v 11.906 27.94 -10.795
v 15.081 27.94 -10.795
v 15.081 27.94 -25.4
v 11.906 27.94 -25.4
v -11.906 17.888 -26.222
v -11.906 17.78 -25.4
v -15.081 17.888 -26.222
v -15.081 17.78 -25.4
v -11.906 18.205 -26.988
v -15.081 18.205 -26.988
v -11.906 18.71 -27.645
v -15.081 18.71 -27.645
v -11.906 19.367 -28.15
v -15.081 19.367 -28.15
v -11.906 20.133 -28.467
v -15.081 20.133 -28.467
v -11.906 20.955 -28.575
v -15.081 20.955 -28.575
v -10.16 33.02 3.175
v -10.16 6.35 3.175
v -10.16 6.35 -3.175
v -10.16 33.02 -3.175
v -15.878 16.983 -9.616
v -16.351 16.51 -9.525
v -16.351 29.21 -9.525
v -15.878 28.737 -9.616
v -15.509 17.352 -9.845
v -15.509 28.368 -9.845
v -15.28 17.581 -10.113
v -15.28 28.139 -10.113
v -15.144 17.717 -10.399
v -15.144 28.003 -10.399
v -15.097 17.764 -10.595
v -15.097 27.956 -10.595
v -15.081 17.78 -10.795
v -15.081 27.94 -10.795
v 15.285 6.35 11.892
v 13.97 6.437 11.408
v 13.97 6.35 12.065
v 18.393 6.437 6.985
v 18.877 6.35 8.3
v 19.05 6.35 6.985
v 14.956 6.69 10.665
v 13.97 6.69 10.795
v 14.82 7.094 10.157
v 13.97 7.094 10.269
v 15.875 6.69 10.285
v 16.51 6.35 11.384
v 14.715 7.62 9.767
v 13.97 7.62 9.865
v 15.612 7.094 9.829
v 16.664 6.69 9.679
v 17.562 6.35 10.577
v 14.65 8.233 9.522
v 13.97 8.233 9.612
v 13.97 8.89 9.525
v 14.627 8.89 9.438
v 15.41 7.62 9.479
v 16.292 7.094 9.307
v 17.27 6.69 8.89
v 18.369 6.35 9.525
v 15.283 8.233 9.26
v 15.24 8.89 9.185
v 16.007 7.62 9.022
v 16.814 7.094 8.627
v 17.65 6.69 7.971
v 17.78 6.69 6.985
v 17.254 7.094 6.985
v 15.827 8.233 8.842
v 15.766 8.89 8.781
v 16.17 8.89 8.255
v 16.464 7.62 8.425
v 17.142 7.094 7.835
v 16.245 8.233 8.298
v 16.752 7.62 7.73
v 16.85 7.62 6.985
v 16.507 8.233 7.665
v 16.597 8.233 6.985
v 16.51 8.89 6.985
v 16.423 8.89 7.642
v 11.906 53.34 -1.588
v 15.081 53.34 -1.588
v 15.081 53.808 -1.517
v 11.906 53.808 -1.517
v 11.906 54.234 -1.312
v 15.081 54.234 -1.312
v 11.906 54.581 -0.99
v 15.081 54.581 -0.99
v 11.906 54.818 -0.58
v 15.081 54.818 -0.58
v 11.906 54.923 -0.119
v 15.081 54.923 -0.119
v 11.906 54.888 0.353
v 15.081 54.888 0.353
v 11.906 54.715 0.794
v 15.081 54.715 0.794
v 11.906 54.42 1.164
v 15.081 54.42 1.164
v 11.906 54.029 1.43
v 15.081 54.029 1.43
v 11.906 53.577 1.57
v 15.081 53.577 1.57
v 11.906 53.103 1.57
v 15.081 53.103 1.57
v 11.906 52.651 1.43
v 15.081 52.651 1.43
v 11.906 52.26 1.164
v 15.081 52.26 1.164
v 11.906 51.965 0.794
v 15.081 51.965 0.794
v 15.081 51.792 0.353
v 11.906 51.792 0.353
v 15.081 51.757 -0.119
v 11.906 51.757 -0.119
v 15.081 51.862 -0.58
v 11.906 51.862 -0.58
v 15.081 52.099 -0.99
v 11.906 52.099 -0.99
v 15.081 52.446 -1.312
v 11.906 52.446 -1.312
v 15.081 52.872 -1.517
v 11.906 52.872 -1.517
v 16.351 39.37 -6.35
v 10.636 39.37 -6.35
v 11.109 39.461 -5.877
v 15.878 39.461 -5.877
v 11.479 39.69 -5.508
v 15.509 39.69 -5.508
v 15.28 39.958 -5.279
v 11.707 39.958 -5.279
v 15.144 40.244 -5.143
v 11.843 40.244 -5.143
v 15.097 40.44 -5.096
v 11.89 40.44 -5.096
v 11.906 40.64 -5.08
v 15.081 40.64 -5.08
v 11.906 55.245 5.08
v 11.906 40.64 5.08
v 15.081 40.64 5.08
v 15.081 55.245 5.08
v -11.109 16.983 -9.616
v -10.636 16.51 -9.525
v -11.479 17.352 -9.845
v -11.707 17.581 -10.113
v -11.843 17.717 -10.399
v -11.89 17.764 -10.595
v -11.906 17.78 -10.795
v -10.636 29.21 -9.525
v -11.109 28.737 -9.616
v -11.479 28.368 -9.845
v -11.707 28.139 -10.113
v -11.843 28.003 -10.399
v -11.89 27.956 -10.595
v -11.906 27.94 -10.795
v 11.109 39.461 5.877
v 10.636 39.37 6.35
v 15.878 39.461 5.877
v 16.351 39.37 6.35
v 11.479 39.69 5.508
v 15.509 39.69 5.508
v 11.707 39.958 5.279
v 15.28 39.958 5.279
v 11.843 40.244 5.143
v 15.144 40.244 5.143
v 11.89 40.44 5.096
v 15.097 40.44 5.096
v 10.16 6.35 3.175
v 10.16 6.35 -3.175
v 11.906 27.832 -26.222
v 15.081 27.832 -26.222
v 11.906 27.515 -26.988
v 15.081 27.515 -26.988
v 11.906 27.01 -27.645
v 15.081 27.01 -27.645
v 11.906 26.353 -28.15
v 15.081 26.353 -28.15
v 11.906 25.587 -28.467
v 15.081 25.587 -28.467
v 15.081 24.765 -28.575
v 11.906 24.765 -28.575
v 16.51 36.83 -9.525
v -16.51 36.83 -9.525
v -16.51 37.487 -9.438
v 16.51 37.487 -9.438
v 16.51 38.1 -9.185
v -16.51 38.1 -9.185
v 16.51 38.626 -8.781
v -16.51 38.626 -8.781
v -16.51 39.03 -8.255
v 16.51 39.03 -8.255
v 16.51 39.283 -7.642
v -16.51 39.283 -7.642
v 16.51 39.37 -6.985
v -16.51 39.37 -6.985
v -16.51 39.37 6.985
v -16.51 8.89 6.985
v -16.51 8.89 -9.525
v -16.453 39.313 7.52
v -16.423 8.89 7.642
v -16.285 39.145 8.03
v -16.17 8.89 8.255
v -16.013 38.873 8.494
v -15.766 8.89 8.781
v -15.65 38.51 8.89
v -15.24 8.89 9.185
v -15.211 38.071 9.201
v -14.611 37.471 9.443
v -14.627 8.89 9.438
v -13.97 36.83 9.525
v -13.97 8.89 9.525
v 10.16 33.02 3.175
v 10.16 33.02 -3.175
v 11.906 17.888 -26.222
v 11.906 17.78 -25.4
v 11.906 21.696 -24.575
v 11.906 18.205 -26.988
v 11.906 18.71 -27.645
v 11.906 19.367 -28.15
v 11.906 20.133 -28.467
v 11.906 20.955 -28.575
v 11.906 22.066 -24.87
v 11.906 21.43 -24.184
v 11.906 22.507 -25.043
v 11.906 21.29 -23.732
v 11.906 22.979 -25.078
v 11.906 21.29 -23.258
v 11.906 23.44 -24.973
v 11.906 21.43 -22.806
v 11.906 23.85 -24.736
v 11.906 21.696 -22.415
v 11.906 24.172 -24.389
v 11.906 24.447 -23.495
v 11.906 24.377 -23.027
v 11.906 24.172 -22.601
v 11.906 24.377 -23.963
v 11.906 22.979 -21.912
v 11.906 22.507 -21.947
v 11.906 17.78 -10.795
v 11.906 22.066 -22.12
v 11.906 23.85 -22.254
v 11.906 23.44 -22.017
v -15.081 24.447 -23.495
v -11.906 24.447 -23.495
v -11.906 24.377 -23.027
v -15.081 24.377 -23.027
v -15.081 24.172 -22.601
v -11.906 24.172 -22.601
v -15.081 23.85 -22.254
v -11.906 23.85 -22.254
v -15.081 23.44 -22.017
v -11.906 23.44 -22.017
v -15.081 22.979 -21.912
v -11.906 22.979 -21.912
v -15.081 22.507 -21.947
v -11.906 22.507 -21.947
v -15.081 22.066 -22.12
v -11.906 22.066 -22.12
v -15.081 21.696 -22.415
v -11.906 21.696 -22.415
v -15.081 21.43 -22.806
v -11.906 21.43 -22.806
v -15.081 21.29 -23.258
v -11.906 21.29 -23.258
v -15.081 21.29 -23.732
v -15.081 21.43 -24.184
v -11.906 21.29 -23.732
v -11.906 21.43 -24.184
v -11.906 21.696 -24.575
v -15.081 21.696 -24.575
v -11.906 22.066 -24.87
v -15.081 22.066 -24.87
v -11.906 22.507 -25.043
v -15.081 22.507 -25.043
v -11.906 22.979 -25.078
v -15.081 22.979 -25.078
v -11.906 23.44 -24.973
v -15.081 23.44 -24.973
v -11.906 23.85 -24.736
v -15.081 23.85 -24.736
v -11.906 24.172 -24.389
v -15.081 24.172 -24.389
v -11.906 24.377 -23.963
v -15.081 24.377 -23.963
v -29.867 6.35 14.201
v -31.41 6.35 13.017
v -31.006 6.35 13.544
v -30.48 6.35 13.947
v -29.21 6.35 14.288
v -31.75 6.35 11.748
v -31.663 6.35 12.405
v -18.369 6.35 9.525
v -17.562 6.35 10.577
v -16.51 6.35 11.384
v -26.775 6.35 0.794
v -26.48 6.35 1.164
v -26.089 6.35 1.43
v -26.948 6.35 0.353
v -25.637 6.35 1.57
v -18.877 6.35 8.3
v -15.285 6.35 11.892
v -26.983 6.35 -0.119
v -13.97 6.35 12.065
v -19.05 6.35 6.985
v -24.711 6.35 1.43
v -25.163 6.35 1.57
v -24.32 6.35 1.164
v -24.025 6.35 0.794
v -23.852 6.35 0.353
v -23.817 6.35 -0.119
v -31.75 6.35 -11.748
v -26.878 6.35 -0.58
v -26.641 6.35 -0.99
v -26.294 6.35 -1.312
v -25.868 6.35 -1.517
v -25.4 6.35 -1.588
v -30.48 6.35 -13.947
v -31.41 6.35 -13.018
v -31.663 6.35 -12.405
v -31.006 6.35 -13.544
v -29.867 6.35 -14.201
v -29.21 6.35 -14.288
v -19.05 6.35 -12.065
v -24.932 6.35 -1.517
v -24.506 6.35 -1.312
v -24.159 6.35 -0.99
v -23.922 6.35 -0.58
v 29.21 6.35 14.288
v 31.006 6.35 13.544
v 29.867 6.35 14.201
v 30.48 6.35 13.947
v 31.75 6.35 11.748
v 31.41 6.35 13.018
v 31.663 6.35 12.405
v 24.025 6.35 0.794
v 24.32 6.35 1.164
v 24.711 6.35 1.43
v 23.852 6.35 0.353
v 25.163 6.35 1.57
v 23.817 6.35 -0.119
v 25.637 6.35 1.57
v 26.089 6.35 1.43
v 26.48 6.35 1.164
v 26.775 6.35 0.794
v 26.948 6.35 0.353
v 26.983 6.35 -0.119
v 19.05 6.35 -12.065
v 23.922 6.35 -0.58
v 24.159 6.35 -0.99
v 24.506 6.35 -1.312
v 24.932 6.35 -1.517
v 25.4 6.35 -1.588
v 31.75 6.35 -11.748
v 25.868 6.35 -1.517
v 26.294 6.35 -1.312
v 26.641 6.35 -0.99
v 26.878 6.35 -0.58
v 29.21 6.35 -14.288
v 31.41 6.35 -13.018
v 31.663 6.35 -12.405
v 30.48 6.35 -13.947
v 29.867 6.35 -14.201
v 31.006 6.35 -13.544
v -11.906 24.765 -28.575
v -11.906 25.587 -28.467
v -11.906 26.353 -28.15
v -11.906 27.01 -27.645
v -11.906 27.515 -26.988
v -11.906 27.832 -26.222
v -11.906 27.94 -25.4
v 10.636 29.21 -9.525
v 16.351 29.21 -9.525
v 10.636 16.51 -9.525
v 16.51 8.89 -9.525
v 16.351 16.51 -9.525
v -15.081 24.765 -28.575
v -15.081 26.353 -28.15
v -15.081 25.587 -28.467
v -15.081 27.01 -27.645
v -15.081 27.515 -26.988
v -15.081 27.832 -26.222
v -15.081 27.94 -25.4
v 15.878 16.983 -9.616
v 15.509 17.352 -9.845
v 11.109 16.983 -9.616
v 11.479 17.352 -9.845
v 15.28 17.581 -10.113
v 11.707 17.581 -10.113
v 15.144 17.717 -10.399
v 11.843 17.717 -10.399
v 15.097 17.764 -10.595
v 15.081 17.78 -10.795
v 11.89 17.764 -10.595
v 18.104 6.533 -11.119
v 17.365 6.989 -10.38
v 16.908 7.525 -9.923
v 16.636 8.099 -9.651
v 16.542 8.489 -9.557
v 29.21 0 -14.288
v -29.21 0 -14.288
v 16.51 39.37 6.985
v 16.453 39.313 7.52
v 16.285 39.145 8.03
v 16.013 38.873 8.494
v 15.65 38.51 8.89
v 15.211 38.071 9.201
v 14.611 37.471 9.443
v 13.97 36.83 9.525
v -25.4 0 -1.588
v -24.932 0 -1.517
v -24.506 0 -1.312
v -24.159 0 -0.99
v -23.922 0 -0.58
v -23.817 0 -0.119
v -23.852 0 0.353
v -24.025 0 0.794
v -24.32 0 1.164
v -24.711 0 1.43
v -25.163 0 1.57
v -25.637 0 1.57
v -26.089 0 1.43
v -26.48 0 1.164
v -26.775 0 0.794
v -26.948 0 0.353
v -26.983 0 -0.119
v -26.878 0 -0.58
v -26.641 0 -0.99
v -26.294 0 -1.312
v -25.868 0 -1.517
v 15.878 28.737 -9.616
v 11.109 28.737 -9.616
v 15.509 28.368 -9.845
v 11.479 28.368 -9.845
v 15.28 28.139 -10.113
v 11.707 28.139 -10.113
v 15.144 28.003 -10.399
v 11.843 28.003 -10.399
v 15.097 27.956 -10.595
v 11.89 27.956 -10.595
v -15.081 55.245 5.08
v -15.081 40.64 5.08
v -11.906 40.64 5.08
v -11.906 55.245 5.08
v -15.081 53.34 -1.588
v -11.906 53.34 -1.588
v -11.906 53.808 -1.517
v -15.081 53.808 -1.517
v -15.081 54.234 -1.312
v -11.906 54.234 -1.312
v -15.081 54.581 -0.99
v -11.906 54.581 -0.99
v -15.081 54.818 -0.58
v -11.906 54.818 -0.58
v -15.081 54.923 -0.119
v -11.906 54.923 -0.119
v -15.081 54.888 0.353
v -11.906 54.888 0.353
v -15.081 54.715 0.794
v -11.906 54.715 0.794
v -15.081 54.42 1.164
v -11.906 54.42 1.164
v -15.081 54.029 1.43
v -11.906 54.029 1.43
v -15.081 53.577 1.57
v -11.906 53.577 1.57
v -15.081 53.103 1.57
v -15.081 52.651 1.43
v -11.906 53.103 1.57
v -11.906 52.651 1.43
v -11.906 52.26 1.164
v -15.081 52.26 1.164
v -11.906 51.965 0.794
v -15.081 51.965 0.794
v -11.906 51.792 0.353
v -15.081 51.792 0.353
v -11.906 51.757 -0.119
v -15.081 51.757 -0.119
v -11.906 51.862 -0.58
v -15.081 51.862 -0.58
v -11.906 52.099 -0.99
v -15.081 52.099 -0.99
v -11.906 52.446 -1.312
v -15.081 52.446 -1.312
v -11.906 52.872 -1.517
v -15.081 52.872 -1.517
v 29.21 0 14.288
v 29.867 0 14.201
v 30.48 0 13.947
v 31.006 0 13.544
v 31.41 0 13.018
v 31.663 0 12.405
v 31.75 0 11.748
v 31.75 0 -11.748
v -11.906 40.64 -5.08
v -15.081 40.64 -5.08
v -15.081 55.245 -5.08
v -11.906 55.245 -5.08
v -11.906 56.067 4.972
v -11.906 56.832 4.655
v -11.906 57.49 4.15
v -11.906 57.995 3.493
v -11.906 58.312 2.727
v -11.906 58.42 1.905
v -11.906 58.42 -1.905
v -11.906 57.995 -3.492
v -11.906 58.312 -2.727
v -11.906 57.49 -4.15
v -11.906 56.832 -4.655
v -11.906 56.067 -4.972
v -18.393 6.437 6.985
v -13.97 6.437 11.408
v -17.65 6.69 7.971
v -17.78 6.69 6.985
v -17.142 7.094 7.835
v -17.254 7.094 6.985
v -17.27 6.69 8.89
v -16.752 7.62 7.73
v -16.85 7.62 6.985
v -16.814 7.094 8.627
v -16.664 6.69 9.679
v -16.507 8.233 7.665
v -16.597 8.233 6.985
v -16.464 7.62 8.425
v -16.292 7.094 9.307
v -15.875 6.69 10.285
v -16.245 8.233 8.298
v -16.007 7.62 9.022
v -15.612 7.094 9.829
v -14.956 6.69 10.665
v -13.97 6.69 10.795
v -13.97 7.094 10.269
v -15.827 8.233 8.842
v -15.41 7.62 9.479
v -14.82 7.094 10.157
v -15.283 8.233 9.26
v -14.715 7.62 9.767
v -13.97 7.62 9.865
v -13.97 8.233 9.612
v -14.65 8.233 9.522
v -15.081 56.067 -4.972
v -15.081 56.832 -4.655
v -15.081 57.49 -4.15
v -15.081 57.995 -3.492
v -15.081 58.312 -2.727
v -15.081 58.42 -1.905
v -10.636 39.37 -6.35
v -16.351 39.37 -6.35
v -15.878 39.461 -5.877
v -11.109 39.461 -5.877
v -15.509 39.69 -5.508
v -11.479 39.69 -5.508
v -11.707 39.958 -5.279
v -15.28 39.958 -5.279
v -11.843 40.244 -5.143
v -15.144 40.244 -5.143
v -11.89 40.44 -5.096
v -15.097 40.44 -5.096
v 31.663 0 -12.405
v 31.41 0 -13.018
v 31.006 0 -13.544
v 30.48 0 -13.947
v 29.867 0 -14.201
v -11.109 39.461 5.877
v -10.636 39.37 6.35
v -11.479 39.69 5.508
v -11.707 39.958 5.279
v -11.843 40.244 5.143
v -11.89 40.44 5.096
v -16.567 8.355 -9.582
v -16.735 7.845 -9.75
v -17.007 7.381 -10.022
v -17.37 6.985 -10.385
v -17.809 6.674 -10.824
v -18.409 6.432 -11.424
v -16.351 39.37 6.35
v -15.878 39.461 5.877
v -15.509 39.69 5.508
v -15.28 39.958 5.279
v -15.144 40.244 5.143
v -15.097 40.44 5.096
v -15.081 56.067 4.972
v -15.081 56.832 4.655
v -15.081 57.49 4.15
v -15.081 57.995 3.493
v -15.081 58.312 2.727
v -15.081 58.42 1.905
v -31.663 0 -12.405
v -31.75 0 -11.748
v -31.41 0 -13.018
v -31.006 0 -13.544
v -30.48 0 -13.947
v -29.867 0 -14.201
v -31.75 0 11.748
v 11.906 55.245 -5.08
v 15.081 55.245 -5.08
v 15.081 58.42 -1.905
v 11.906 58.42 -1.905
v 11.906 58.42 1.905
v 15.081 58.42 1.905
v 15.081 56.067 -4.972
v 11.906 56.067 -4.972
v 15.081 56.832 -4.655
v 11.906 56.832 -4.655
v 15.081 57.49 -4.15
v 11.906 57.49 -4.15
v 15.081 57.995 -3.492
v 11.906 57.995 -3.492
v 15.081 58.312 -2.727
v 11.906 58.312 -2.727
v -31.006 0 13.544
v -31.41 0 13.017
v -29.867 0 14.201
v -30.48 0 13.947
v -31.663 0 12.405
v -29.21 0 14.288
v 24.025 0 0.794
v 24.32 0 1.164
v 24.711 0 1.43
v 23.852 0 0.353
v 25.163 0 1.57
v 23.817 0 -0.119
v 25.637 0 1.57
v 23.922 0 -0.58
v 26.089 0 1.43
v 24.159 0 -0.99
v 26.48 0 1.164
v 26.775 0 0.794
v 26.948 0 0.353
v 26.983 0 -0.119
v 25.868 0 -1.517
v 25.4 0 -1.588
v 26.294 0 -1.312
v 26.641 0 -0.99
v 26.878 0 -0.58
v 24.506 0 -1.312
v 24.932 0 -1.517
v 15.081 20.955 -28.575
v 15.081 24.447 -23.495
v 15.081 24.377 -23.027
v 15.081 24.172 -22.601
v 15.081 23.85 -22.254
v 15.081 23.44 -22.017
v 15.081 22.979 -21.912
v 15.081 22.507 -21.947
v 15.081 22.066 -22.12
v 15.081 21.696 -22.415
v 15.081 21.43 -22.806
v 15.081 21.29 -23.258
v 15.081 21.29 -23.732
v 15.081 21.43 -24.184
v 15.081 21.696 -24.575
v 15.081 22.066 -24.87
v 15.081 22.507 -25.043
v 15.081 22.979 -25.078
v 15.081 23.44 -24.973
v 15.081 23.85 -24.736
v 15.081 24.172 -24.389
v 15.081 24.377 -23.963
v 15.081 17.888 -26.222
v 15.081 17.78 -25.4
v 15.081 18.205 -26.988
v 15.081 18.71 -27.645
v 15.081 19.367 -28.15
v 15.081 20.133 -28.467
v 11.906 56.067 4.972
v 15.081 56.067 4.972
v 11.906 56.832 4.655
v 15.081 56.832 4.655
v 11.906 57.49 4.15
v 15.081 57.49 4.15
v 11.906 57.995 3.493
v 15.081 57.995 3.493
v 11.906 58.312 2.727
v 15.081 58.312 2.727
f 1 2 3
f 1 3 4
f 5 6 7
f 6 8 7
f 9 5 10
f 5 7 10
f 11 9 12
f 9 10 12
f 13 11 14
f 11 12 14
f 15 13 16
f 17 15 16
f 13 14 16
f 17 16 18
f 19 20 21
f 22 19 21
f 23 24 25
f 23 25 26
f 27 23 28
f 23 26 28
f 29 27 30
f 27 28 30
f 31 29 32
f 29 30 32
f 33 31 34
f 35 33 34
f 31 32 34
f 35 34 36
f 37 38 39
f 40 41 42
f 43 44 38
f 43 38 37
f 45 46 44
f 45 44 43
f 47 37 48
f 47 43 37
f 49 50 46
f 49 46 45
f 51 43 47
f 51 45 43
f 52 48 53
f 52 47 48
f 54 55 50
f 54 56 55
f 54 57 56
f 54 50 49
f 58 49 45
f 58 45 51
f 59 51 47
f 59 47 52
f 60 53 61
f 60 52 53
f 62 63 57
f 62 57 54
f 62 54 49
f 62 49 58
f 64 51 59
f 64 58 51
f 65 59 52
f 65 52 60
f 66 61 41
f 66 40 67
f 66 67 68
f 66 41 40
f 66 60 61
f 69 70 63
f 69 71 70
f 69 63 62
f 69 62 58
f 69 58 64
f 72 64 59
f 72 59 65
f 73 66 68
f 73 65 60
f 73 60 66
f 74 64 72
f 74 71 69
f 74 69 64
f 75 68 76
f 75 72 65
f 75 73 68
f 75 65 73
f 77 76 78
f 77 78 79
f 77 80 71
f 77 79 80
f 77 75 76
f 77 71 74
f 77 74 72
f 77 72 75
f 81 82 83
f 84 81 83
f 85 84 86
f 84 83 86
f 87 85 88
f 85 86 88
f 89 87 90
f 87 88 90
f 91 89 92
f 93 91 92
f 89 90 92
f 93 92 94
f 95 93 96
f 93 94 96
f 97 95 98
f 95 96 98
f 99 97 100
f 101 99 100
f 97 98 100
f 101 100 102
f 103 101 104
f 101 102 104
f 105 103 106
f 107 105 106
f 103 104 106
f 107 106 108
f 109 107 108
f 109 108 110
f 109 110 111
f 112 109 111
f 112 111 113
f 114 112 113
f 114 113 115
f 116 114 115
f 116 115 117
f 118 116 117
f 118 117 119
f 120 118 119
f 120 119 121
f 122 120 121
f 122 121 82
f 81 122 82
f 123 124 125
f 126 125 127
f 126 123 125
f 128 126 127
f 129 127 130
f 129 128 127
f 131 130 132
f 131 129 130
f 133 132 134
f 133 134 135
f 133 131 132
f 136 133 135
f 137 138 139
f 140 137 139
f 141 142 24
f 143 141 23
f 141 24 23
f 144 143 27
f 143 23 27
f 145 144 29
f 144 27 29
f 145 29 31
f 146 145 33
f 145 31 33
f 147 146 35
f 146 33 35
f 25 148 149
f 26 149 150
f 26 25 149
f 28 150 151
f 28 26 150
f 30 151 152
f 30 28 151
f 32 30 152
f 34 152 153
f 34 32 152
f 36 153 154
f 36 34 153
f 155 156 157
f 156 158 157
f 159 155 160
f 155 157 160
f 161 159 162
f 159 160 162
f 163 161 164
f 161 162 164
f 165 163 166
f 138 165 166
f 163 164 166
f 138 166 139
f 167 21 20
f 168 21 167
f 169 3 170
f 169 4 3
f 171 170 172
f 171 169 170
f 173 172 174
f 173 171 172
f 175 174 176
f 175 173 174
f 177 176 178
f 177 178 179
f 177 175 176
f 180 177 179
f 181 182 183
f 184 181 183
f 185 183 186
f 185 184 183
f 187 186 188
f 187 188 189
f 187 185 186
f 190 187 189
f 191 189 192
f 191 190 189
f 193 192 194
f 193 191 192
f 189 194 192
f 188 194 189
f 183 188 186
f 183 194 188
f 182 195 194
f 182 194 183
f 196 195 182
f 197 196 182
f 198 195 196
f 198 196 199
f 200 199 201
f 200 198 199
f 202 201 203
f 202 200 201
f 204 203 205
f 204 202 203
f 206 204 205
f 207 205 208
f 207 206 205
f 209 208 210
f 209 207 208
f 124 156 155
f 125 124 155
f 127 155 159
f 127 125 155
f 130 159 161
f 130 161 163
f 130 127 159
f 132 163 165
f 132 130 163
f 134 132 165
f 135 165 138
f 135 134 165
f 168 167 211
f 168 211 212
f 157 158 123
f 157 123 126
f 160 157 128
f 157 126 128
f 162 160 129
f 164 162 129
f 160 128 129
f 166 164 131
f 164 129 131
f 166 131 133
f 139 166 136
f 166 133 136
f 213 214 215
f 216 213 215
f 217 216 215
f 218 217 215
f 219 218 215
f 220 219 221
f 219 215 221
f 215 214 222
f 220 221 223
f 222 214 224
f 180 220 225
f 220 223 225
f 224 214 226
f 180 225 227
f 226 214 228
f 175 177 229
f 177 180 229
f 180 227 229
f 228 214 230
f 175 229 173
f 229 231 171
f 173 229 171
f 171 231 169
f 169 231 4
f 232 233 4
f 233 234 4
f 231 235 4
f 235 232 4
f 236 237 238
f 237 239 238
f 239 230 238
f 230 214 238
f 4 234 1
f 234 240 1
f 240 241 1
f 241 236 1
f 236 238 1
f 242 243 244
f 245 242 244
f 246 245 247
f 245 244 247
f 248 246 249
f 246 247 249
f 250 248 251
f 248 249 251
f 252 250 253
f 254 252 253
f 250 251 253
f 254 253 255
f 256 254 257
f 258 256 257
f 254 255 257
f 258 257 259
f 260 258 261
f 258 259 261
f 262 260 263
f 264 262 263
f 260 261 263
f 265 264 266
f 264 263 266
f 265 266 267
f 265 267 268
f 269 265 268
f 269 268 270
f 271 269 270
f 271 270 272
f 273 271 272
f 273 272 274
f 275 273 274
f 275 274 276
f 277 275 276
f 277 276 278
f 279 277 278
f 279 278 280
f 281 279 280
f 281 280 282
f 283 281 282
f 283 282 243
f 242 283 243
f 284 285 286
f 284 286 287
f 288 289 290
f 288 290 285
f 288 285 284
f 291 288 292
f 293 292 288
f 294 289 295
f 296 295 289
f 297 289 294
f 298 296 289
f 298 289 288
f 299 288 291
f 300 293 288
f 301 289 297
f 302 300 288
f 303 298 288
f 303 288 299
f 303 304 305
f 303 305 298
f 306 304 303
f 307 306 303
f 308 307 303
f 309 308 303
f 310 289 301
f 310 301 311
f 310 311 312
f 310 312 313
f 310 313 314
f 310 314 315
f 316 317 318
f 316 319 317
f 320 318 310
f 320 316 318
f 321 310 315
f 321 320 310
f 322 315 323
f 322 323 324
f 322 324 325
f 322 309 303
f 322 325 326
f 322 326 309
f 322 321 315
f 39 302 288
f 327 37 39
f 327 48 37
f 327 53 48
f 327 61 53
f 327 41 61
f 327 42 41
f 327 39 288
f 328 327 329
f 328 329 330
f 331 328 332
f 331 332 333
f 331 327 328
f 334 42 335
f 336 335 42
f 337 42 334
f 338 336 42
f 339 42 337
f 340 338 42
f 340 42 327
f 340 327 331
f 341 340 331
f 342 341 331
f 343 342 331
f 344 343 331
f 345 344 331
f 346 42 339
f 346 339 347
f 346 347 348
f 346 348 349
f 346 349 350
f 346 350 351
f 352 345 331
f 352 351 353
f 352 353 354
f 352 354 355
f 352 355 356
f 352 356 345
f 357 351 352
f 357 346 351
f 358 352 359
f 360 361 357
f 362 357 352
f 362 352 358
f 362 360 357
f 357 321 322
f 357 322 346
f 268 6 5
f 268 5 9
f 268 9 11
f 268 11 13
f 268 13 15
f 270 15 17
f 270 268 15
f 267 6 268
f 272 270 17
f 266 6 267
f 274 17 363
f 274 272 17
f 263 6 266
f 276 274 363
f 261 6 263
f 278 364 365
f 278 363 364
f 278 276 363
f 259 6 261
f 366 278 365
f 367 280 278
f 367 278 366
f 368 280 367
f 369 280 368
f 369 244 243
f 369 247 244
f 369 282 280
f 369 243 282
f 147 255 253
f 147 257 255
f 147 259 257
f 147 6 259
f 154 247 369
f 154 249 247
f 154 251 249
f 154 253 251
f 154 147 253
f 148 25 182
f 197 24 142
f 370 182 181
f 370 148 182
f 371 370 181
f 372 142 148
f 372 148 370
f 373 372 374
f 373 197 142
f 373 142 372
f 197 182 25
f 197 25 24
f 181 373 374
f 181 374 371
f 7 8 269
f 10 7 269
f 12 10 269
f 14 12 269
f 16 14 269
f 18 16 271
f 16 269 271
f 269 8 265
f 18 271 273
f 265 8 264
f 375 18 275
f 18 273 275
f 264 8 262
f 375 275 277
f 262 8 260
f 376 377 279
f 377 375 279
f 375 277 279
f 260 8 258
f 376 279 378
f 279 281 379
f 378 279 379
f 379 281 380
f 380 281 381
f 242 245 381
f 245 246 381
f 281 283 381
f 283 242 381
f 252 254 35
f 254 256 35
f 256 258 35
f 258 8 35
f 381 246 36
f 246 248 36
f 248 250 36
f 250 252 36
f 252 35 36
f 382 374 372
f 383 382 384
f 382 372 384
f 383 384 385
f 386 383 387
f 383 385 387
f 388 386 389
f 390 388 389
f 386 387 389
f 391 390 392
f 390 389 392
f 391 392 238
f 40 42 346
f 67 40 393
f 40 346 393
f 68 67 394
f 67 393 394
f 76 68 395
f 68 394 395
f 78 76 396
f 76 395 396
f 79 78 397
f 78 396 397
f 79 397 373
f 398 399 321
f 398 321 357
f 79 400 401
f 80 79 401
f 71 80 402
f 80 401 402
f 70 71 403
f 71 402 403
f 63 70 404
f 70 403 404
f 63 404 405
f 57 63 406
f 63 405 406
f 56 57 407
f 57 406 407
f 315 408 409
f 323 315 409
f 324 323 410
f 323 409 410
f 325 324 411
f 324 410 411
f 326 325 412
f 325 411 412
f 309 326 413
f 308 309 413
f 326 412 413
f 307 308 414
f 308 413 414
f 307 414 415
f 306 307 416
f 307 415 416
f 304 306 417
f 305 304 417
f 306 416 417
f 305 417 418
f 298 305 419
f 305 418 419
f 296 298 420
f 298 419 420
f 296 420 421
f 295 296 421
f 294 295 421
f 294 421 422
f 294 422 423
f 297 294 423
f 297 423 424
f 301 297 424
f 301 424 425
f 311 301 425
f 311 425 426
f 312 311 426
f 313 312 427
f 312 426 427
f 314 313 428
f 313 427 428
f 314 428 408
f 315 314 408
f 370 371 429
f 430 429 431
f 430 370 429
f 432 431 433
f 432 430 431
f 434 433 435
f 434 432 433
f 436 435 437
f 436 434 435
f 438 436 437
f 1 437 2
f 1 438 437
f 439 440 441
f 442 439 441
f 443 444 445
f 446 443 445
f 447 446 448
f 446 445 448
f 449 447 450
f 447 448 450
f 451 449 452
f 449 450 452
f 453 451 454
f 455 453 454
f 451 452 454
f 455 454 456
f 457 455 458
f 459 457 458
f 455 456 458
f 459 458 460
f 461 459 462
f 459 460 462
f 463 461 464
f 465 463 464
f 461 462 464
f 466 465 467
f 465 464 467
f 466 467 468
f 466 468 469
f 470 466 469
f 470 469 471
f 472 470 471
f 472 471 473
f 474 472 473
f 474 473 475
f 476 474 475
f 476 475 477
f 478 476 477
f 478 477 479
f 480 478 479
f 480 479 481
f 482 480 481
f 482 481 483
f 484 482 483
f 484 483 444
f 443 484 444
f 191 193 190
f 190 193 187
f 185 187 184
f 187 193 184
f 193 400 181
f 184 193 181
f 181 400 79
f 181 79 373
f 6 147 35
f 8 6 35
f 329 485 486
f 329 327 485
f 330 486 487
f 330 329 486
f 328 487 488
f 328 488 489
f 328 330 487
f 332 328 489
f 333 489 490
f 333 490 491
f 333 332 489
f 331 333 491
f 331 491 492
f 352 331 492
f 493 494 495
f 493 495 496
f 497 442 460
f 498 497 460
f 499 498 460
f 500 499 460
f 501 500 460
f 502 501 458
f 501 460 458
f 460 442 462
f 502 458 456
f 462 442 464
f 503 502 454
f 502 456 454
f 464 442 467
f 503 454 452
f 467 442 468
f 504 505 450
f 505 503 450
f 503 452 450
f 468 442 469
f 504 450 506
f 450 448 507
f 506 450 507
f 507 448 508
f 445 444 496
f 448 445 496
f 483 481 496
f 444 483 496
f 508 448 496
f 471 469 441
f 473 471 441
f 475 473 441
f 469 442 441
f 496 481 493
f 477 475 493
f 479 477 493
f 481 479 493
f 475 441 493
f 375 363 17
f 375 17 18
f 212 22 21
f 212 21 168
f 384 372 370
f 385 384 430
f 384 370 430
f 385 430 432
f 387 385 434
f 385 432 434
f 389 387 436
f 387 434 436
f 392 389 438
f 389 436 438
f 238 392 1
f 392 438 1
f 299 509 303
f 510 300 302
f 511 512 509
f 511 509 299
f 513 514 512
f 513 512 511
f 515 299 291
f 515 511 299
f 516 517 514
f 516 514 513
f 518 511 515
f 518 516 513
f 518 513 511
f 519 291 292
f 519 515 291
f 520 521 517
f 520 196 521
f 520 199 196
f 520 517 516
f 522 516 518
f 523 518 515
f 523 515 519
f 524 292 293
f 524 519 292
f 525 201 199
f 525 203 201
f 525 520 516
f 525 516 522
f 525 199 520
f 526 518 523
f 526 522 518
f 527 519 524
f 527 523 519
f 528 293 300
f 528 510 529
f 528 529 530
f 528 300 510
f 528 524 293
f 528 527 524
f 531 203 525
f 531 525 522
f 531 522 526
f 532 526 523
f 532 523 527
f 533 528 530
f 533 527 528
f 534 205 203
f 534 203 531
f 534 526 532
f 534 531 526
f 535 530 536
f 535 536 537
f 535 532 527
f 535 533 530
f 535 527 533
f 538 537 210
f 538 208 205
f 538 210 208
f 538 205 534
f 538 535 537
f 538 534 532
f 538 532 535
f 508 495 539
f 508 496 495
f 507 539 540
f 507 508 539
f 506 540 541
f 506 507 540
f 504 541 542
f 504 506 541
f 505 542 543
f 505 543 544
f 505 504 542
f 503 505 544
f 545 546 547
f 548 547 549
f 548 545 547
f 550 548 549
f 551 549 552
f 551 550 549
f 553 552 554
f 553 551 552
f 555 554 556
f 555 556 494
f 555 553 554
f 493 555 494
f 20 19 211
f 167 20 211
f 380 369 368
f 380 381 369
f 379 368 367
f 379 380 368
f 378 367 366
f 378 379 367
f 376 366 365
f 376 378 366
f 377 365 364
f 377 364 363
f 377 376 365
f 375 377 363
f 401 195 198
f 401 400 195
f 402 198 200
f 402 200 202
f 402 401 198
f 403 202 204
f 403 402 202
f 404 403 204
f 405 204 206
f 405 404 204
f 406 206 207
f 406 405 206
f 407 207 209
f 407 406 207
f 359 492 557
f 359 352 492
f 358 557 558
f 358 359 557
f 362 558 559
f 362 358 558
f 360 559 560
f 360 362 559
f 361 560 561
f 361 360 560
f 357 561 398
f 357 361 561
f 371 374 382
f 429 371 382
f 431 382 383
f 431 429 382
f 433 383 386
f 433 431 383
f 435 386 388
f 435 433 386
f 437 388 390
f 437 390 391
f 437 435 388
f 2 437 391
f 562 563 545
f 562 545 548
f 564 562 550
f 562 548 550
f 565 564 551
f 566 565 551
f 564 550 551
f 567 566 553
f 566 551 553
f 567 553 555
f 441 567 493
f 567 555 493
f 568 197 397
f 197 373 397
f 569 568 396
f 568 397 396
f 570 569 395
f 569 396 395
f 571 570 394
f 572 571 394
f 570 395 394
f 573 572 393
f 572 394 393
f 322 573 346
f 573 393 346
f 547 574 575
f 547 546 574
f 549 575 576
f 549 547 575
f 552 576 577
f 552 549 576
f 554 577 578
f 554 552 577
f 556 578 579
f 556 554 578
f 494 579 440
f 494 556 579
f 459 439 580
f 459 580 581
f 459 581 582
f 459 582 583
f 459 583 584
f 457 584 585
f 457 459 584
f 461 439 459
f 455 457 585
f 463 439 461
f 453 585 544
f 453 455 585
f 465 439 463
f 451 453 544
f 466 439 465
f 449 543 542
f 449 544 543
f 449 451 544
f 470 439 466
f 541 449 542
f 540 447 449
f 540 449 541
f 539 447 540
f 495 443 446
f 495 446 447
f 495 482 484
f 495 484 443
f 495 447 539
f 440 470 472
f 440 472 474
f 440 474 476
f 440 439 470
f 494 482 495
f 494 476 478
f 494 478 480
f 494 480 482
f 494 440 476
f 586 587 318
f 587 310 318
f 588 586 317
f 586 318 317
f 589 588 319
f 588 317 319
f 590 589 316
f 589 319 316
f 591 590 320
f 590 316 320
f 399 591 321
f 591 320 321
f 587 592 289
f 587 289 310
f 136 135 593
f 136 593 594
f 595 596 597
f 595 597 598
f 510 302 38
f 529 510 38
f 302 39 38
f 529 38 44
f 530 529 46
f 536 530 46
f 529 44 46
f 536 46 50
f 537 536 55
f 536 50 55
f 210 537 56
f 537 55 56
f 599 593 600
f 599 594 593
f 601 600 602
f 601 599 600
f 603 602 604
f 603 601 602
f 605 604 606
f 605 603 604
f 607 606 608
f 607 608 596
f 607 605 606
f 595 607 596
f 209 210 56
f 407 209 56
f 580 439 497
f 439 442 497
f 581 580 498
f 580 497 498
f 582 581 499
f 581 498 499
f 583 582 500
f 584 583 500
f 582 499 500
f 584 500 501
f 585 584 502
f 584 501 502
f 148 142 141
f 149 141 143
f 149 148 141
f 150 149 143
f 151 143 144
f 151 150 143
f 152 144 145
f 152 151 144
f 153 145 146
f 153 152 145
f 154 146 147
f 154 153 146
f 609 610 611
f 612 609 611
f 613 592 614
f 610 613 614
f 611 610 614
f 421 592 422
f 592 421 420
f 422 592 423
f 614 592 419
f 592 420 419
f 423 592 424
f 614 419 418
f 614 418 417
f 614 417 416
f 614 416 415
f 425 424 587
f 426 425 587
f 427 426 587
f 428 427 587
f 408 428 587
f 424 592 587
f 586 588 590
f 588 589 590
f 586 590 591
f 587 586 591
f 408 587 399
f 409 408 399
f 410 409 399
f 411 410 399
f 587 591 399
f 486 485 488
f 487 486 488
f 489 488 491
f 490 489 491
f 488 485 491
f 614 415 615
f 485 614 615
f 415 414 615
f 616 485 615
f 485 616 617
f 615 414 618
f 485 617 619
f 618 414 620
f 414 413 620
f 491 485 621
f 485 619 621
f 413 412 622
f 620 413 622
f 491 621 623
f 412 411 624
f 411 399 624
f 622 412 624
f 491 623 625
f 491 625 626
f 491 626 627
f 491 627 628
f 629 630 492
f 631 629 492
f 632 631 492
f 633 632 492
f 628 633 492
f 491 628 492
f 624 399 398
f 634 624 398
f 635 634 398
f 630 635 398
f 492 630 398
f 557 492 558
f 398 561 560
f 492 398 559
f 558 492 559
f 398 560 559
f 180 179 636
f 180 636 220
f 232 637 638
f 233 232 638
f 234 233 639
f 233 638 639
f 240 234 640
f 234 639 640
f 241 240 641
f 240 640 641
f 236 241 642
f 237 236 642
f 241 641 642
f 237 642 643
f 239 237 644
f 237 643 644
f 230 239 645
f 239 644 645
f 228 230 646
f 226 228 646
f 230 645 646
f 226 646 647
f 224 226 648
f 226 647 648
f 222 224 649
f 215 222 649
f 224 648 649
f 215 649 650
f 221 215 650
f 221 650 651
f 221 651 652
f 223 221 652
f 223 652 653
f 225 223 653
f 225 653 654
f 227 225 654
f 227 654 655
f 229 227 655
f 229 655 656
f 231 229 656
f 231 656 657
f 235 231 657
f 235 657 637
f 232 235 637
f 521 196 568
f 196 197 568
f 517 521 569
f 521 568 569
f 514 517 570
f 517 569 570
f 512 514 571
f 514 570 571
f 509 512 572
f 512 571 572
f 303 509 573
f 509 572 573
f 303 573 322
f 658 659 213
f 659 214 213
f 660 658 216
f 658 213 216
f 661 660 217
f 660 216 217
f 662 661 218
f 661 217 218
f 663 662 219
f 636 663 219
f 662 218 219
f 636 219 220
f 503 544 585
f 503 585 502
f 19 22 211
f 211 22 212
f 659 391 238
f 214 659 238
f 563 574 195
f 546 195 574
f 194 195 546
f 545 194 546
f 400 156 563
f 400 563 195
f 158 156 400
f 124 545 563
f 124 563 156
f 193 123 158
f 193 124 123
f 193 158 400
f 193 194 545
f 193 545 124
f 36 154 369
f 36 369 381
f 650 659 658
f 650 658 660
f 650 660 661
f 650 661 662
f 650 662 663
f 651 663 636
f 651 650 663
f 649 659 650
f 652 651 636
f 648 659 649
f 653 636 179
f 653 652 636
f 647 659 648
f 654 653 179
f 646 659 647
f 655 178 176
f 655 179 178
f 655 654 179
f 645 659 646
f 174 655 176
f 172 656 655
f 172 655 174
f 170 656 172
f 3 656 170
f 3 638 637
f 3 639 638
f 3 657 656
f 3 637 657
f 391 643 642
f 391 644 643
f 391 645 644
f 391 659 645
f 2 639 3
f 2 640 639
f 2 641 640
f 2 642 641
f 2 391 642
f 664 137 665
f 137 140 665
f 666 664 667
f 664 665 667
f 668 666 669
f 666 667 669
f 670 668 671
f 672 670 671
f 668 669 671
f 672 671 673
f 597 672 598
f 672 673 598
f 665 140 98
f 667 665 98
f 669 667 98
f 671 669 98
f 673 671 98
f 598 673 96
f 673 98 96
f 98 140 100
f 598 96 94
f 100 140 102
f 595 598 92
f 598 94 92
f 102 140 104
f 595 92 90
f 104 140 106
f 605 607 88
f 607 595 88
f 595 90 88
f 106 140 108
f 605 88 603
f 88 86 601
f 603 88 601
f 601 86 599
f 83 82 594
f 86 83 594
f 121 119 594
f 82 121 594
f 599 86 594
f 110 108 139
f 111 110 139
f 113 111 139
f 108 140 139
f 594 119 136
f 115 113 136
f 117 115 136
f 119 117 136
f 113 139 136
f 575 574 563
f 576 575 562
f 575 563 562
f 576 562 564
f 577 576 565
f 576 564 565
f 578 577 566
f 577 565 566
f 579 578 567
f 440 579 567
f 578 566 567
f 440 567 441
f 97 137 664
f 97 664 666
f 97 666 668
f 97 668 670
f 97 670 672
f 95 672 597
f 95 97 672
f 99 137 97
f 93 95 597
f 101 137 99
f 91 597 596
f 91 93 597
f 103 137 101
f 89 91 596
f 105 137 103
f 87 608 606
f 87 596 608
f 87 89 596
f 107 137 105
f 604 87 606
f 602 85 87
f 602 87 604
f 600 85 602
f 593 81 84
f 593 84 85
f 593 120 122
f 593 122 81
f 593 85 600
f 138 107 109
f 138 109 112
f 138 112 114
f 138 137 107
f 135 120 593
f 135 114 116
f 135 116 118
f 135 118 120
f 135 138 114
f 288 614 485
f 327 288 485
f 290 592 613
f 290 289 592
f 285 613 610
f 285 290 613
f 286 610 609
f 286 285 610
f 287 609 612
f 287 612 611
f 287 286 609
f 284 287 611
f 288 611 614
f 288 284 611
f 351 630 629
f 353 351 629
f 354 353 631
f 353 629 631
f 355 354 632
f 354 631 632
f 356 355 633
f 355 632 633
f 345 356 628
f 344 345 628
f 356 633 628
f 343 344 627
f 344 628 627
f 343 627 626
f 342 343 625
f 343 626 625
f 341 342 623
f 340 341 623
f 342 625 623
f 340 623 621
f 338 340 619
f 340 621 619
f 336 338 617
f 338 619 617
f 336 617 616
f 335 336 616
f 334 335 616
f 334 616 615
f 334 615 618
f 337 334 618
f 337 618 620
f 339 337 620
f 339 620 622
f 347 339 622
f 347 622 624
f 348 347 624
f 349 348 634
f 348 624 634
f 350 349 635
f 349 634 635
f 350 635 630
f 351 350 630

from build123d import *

# Parameters (mm, degrees)
SKETCH1_W           = 63.5
SKETCH1_H           = 28.575
BOSS_EXTRUDE1_DEPTH = 6.35
FILLET1_R           = 2.54
SKETCH2_W           = 33.02
SKETCH2_H           = 19.05
BOSS_EXTRUDE3_DEPTH = 33.02
SHELL1_START        = 6.35
SHELL1_OUTLINE_W    = 20.32
SHELL1_OUTLINE_H    = 6.35
SHELL1_DEPTH        = 26.67
SKETCH3_R           = 1.5875
CUT_EXTRUDE1_DEPTH  = 6.35
SKETCH4_W           = 3.175
SKETCH4_H           = 10.16
BOSS_EXTRUDE4_DEPTH = 19.05
FILLET4_R           = 1.27
FILLET6_R           = 3.175
SKETCH5_R           = 1.5875
CUT_EXTRUDE2_DEPTH  = 50.8
SKETCH8_W           = 3.175
SKETCH8_H           = 10.16
BOSS_EXTRUDE5_DEPTH = 19.05
SKETCH9_R           = 1.5875
CUT_EXTRUDE3_DEPTH  = 50.8
FILLET7_R           = 1.27
FILLET8_R           = 2.54
FILLET9_R           = 3.175


# Read off the part's stored shape, not the designer's step: Shell1
with BuildPart() as part:
    # Sketch1 → Boss-Extrude1 (new body)
    with BuildSketch(Plane(origin=(0, 0, 0), x_dir=(1, 0, 0), z_dir=(0, 1, 0))):
        Rectangle(SKETCH1_W, SKETCH1_H)
    extrude(amount=BOSS_EXTRUDE1_DEPTH)

    # Fillet1
    fillet1_edges = [part.edges().sort_by_distance(p)[0] for p in [
        (31.75, 3.175, 14.2875),
        (-31.75, 3.175, 14.2875),
        (-31.75, 3.175, -14.2875),
        (31.75, 3.175, -14.2875),
    ]]
    fillet(fillet1_edges, radius=FILLET1_R)

    # Sketch2 → Boss-Extrude3 (add)
    with BuildSketch(Plane(origin=(0, 6.35, 0), x_dir=(1, 0, 0), z_dir=(0, 1, 0))):
        Rectangle(SKETCH2_W, SKETCH2_H)
    extrude(amount=BOSS_EXTRUDE3_DEPTH)

    # Shell1 outline → Shell1 (cut)
    with BuildSketch(Plane(origin=(0, 0, 0), x_dir=(1, 0, 0), z_dir=(0, 1, 0)).offset(SHELL1_START)):
        Rectangle(SHELL1_OUTLINE_W, SHELL1_OUTLINE_H)
    extrude(amount=SHELL1_DEPTH, mode=Mode.SUBTRACT)

    # Sketch3 → Cut-Extrude1 (cut)
    with BuildSketch(Plane.XZ):
        with Locations(Location((-25.4, 0, 0), (0, 0, 270))):
            Circle(SKETCH3_R)
        with Locations(Location((25.4, 0, 0), (0, 0, 270))):
            Circle(SKETCH3_R)
    extrude(amount=-CUT_EXTRUDE1_DEPTH, mode=Mode.SUBTRACT)

    # Sketch4 → Boss-Extrude4 (add)
    with BuildSketch(Plane(origin=(0, 39.37, 0), x_dir=(1, 0, 0), z_dir=(0, 1, 0))):
        with Locations((-13.49375, 0)):
            Rectangle(SKETCH4_W, SKETCH4_H)
        with Locations((13.49375, 0)):
            Rectangle(SKETCH4_W, SKETCH4_H)
    extrude(amount=BOSS_EXTRUDE4_DEPTH)

    # Fillet4
    fillet4_edges = [part.edges().sort_by_distance(p)[0] for p in [
        (15.08125, 39.37, 0),
        (13.49375, 39.37, -5.08),
        (11.90625, 39.37, 0),
        (13.49375, 39.37, 5.08),
        (-15.08125, 39.37, 0),
        (-13.49375, 39.37, 5.08),
        (-11.90625, 39.37, 0),
        (-13.49375, 39.37, -5.08),
    ]]
    fillet(fillet4_edges, radius=FILLET4_R)

    # Fillet6
    fillet6_edges = [part.edges().sort_by_distance(p)[0] for p in [
        (13.49375, 58.42, -5.08),
        (13.49375, 58.42, 5.08),
        (-13.49375, 58.42, 5.08),
        (-13.49375, 58.42, -5.08),
    ]]
    fillet(fillet6_edges, radius=FILLET6_R)

    # Sketch5 → Cut-Extrude2 (cut)
    with BuildSketch(Plane(origin=(15.08125, 0, 0), x_dir=(0, 0, -1), z_dir=(1, 0, 0))):
        with Locations((0, 53.34)):
            Circle(SKETCH5_R)
    extrude(amount=-CUT_EXTRUDE2_DEPTH, mode=Mode.SUBTRACT)

    # Sketch8 → Boss-Extrude5 (add)
    with BuildSketch(Plane(origin=(0, 0, -9.525), x_dir=(-1, 0, 0), z_dir=(0, 0, -1))):
        with Locations((-13.49375, 22.86)):
            Rectangle(SKETCH8_W, SKETCH8_H)
        with Locations((13.49375, 22.86)):
            Rectangle(SKETCH8_W, SKETCH8_H)
    extrude(amount=BOSS_EXTRUDE5_DEPTH)

    # Sketch9 → Cut-Extrude3 (cut)
    with BuildSketch(Plane(origin=(15.08125, 0, 0), x_dir=(0, 0, -1), z_dir=(1, 0, 0))):
        with Locations(Location((23.495, 22.86, 0), (0, 0, 90))):
            Circle(SKETCH9_R)
    extrude(amount=-CUT_EXTRUDE3_DEPTH, mode=Mode.SUBTRACT)

    # Fillet7
    fillet7_edges = [part.edges().sort_by_distance(p)[0] for p in [
        (-15.08125, 22.86, -9.525),
        (-13.49375, 27.94, -9.525),
        (-11.90625, 22.86, -9.525),
        (-13.49375, 17.78, -9.525),
        (13.49375, 17.78, -9.525),
        (11.90625, 22.86, -9.525),
        (13.49375, 27.94, -9.525),
        (15.08125, 22.86, -9.525),
    ]]
    fillet(fillet7_edges, radius=FILLET7_R)

    # Fillet8
    fillet8_edges = [part.edges().sort_by_distance(p)[0] for p in [
        (16.51, 6.35, 0),
        (16.51, 22.86, 9.525),
        (0, 6.35, -9.525),
        (-16.51, 6.35, 0),
        (0, 6.35, 9.525),
        (-16.51, 22.86, 9.525),
        (0, 39.37, -9.525),
        (0, 39.37, 9.525),
    ]]
    fillet(fillet8_edges, radius=FILLET8_R)

    # Fillet9
    fillet9_edges = [part.edges().sort_by_distance(p)[0] for p in [
        (-13.49375, 27.94, -28.575),
        (-13.49375, 17.78, -28.575),
        (13.49375, 17.78, -28.575),
        (13.49375, 27.94, -28.575),
    ]]
    fillet(fillet9_edges, radius=FILLET9_R)


solid = part.part
